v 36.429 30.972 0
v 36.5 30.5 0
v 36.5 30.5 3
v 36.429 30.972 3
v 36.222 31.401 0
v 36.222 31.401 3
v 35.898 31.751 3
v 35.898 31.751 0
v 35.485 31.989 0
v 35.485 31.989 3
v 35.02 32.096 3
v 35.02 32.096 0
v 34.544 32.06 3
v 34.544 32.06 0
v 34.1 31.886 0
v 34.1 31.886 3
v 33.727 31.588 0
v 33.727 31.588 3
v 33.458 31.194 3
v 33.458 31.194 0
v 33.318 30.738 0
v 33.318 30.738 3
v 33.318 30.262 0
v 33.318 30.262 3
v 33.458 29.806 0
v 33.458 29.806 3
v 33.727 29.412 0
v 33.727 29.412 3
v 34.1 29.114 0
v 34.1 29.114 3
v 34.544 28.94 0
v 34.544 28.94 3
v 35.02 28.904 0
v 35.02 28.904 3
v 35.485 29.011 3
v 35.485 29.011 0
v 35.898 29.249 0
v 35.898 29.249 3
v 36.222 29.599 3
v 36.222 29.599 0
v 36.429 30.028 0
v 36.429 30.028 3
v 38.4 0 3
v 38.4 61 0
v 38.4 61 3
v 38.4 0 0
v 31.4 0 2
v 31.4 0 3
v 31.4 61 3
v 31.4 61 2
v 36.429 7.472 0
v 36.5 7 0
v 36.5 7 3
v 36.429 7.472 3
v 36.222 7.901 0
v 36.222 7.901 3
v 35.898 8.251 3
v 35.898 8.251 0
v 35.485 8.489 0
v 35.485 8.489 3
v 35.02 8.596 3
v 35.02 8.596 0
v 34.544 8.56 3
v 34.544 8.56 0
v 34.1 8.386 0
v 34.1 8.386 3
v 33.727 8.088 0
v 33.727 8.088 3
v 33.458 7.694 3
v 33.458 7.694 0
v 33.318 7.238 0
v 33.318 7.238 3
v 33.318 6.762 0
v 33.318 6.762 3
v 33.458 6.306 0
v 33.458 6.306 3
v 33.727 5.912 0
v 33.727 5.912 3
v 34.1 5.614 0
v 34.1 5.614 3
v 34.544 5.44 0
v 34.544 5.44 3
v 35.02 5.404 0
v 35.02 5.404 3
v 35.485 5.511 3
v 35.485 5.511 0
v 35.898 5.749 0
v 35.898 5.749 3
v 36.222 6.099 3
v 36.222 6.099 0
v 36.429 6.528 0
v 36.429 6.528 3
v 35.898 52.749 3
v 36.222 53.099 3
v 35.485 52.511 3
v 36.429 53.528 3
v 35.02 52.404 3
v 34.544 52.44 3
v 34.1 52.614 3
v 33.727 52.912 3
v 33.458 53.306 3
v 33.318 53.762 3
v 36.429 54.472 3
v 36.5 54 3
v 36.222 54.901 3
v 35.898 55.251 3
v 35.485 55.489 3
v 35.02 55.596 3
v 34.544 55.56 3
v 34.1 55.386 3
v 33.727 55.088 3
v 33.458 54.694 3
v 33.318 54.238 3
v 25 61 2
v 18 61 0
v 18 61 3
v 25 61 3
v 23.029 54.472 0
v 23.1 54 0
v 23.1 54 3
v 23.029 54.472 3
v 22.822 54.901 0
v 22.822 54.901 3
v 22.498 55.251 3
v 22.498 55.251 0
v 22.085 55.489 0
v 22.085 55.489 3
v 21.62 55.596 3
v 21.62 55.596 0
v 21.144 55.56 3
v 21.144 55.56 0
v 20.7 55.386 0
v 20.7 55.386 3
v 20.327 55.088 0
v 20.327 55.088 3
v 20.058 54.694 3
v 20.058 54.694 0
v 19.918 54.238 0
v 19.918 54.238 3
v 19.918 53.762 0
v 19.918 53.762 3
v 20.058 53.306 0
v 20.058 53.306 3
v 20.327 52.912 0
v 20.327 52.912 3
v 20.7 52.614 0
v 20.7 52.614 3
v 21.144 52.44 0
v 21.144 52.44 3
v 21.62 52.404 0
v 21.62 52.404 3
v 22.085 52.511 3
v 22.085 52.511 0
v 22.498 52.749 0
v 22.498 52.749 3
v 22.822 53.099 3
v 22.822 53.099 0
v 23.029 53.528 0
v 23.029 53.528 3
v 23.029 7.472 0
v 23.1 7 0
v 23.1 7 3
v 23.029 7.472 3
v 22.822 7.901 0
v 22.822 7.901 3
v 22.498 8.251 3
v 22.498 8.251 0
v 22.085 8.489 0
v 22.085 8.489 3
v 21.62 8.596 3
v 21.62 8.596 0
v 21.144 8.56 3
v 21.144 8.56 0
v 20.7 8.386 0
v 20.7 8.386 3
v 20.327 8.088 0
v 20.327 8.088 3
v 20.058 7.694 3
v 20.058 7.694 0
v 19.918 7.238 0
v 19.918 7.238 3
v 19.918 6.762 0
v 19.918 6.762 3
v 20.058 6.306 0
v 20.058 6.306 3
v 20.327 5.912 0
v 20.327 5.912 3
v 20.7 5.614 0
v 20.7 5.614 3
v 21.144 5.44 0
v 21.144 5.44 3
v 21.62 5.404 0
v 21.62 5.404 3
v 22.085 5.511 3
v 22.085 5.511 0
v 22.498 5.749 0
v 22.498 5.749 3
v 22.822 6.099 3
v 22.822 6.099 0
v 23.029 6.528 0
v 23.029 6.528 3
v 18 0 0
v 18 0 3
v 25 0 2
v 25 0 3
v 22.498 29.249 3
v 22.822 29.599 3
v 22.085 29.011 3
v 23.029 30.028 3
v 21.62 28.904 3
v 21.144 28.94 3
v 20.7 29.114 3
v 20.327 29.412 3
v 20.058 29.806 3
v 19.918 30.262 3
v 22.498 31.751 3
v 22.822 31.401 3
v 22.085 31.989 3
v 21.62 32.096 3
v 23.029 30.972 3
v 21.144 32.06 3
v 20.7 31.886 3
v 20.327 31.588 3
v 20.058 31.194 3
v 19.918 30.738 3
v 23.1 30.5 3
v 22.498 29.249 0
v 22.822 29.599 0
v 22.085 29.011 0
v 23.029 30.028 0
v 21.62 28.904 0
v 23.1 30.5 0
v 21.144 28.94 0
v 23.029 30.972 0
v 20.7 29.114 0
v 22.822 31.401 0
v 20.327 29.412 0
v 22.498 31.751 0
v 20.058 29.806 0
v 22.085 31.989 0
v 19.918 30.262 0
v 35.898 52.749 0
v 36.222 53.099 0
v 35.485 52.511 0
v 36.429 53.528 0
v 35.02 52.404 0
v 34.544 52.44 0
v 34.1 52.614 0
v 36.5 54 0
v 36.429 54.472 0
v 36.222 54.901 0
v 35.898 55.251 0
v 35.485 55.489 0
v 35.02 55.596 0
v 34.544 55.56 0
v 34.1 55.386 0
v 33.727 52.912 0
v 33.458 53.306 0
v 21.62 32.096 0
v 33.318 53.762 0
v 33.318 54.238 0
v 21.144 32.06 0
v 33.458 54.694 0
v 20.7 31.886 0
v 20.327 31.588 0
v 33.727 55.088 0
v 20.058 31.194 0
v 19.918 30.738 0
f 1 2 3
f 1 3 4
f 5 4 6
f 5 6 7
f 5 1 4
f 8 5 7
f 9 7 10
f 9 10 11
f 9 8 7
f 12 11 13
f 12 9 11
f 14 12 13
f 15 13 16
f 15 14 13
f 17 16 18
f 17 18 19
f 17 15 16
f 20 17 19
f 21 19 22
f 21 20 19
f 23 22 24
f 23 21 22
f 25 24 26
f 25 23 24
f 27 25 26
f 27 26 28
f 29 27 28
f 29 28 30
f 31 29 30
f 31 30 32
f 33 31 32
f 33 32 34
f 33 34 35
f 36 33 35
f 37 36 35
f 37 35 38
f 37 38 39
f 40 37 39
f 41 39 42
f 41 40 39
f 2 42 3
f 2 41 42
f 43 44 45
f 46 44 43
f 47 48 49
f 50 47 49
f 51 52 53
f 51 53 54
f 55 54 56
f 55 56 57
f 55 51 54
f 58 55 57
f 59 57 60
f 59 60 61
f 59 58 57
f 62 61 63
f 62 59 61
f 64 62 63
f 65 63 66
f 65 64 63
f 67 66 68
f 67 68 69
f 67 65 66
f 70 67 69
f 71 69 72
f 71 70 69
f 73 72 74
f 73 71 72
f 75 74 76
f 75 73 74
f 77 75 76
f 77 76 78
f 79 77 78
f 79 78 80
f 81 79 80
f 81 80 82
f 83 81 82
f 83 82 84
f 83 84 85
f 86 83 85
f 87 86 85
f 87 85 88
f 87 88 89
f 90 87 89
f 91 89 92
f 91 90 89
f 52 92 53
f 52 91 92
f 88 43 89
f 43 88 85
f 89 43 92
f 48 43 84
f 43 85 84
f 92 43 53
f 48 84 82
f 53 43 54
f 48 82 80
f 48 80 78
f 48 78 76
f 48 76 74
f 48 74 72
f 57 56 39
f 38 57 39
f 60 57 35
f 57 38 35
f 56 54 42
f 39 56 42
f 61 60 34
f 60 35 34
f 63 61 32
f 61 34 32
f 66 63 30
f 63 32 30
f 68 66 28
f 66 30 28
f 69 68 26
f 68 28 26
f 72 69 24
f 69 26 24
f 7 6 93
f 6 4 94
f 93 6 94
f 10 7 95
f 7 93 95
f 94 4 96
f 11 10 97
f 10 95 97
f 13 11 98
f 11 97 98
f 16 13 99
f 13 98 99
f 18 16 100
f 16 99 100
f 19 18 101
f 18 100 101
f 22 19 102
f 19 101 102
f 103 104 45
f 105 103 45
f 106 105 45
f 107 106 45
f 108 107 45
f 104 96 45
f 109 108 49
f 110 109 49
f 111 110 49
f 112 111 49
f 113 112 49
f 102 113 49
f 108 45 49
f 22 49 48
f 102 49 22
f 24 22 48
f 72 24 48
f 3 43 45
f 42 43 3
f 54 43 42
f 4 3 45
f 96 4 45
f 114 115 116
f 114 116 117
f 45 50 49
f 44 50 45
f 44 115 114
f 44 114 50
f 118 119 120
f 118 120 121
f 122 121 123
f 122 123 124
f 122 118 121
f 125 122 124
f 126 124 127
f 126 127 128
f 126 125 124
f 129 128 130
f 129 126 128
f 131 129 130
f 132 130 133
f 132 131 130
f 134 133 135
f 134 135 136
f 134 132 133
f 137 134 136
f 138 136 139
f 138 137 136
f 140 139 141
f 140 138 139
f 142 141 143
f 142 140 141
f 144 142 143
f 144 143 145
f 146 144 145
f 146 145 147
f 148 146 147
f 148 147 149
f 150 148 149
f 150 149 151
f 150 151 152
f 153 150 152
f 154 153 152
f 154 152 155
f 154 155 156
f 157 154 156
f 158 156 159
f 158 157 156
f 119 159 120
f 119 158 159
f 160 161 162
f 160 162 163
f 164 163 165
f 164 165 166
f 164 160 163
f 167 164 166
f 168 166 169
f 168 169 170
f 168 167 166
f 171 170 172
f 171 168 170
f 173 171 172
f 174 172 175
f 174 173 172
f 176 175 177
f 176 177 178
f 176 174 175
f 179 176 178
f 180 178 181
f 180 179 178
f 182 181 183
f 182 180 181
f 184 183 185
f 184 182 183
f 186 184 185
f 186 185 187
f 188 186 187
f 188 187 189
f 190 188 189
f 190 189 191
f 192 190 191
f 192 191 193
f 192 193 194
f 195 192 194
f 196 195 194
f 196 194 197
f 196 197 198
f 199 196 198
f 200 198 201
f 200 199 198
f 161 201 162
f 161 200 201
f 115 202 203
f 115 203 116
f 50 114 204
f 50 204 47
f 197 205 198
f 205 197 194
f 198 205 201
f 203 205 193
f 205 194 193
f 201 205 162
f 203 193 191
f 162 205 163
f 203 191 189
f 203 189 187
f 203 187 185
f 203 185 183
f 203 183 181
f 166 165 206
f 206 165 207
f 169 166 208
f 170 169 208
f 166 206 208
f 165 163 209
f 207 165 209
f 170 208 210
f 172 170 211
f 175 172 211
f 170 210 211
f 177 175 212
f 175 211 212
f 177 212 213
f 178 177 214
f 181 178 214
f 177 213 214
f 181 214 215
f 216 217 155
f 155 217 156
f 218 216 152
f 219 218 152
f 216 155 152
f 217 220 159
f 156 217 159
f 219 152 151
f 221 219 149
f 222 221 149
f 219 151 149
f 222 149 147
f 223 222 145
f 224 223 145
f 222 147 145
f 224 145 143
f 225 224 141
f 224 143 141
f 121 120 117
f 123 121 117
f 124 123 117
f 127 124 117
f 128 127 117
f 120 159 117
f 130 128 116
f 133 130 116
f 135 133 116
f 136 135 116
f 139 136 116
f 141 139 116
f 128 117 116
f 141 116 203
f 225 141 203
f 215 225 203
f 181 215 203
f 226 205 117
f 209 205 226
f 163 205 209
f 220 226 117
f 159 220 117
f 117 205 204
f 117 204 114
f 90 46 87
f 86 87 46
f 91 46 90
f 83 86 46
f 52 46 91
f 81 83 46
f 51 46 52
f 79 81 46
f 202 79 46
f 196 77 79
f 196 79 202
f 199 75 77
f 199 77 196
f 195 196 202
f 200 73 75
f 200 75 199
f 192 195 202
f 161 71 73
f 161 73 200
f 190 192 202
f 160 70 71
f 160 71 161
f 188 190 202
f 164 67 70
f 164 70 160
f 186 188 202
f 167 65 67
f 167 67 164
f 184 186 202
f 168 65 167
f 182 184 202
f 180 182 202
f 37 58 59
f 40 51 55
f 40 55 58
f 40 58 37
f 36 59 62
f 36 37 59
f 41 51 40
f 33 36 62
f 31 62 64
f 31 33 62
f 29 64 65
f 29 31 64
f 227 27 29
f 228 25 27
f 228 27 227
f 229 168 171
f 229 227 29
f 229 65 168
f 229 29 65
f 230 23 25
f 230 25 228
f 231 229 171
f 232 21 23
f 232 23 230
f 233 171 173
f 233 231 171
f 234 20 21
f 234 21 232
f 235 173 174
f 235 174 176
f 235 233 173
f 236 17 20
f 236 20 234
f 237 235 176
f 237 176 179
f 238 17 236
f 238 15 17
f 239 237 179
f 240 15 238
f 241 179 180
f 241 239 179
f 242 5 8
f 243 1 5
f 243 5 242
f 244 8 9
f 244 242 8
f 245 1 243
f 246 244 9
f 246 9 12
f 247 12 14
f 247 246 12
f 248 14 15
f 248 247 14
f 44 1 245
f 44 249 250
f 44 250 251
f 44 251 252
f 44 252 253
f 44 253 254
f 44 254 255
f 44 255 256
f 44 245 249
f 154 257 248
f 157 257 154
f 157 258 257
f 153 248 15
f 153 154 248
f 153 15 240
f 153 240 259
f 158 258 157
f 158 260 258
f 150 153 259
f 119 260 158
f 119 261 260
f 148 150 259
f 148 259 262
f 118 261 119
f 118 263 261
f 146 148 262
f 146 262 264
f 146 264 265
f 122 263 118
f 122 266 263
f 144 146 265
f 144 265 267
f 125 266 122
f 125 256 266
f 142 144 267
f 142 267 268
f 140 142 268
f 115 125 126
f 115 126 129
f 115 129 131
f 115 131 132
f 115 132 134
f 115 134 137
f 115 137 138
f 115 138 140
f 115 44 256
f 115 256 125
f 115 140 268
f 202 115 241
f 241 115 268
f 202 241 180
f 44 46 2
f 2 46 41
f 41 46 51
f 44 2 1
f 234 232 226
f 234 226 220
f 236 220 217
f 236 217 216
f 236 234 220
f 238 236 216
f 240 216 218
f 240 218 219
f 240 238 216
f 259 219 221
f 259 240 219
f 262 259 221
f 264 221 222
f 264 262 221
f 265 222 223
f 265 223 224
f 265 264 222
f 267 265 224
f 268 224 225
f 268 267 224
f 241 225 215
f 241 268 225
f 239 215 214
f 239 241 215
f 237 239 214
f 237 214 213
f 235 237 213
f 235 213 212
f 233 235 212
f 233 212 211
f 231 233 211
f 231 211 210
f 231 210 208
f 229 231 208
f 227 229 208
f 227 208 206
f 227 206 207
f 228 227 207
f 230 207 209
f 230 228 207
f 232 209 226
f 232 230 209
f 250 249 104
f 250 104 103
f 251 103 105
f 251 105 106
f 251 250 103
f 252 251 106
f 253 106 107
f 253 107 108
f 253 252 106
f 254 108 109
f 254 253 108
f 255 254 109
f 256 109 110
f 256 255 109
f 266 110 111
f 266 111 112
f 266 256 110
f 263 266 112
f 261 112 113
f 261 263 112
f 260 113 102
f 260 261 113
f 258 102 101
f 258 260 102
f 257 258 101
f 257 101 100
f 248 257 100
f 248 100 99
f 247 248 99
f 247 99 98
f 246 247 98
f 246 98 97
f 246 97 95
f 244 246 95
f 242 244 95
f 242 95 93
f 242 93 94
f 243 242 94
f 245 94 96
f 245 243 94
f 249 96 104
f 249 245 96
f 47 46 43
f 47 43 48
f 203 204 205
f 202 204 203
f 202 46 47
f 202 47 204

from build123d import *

# Parameters (mm, degrees)
SKETCH_R     = 1.6
PAD_DEPTH    = 3
SKETCH001_W  = 6.4
SKETCH001_H  = 89.324535
POCKET_DEPTH = 1


with BuildPart() as part:
    # Sketch → Pad (new body)
    with BuildSketch(Plane.XY):
        Polygon((18, 0), (18, 61), (38.4, 61), (38.400002, 0), align=None)
        with Locations((21.5, 54)):
            Circle(SKETCH_R, mode=Mode.SUBTRACT)
        with Locations((21.5, 7)):
            Circle(SKETCH_R, mode=Mode.SUBTRACT)
        with Locations((34.9, 7)):
            Circle(SKETCH_R, mode=Mode.SUBTRACT)
        with Locations((34.900002, 54)):
            Circle(SKETCH_R, mode=Mode.SUBTRACT)
        with Locations((34.9, 30.5)):
            Circle(SKETCH_R, mode=Mode.SUBTRACT)
        with Locations((21.5, 30.5)):
            Circle(SKETCH_R, mode=Mode.SUBTRACT)
    extrude(amount=PAD_DEPTH)

    # Sketch001 (on Face12 of Pad) → Pocket (cut)
    with BuildSketch(Plane.XY.offset(3)):
        with Locations((28.2, 34.865138)):
            Rectangle(SKETCH001_W, SKETCH001_H)
    extrude(amount=-POCKET_DEPTH, mode=Mode.SUBTRACT)


solid = part.part
